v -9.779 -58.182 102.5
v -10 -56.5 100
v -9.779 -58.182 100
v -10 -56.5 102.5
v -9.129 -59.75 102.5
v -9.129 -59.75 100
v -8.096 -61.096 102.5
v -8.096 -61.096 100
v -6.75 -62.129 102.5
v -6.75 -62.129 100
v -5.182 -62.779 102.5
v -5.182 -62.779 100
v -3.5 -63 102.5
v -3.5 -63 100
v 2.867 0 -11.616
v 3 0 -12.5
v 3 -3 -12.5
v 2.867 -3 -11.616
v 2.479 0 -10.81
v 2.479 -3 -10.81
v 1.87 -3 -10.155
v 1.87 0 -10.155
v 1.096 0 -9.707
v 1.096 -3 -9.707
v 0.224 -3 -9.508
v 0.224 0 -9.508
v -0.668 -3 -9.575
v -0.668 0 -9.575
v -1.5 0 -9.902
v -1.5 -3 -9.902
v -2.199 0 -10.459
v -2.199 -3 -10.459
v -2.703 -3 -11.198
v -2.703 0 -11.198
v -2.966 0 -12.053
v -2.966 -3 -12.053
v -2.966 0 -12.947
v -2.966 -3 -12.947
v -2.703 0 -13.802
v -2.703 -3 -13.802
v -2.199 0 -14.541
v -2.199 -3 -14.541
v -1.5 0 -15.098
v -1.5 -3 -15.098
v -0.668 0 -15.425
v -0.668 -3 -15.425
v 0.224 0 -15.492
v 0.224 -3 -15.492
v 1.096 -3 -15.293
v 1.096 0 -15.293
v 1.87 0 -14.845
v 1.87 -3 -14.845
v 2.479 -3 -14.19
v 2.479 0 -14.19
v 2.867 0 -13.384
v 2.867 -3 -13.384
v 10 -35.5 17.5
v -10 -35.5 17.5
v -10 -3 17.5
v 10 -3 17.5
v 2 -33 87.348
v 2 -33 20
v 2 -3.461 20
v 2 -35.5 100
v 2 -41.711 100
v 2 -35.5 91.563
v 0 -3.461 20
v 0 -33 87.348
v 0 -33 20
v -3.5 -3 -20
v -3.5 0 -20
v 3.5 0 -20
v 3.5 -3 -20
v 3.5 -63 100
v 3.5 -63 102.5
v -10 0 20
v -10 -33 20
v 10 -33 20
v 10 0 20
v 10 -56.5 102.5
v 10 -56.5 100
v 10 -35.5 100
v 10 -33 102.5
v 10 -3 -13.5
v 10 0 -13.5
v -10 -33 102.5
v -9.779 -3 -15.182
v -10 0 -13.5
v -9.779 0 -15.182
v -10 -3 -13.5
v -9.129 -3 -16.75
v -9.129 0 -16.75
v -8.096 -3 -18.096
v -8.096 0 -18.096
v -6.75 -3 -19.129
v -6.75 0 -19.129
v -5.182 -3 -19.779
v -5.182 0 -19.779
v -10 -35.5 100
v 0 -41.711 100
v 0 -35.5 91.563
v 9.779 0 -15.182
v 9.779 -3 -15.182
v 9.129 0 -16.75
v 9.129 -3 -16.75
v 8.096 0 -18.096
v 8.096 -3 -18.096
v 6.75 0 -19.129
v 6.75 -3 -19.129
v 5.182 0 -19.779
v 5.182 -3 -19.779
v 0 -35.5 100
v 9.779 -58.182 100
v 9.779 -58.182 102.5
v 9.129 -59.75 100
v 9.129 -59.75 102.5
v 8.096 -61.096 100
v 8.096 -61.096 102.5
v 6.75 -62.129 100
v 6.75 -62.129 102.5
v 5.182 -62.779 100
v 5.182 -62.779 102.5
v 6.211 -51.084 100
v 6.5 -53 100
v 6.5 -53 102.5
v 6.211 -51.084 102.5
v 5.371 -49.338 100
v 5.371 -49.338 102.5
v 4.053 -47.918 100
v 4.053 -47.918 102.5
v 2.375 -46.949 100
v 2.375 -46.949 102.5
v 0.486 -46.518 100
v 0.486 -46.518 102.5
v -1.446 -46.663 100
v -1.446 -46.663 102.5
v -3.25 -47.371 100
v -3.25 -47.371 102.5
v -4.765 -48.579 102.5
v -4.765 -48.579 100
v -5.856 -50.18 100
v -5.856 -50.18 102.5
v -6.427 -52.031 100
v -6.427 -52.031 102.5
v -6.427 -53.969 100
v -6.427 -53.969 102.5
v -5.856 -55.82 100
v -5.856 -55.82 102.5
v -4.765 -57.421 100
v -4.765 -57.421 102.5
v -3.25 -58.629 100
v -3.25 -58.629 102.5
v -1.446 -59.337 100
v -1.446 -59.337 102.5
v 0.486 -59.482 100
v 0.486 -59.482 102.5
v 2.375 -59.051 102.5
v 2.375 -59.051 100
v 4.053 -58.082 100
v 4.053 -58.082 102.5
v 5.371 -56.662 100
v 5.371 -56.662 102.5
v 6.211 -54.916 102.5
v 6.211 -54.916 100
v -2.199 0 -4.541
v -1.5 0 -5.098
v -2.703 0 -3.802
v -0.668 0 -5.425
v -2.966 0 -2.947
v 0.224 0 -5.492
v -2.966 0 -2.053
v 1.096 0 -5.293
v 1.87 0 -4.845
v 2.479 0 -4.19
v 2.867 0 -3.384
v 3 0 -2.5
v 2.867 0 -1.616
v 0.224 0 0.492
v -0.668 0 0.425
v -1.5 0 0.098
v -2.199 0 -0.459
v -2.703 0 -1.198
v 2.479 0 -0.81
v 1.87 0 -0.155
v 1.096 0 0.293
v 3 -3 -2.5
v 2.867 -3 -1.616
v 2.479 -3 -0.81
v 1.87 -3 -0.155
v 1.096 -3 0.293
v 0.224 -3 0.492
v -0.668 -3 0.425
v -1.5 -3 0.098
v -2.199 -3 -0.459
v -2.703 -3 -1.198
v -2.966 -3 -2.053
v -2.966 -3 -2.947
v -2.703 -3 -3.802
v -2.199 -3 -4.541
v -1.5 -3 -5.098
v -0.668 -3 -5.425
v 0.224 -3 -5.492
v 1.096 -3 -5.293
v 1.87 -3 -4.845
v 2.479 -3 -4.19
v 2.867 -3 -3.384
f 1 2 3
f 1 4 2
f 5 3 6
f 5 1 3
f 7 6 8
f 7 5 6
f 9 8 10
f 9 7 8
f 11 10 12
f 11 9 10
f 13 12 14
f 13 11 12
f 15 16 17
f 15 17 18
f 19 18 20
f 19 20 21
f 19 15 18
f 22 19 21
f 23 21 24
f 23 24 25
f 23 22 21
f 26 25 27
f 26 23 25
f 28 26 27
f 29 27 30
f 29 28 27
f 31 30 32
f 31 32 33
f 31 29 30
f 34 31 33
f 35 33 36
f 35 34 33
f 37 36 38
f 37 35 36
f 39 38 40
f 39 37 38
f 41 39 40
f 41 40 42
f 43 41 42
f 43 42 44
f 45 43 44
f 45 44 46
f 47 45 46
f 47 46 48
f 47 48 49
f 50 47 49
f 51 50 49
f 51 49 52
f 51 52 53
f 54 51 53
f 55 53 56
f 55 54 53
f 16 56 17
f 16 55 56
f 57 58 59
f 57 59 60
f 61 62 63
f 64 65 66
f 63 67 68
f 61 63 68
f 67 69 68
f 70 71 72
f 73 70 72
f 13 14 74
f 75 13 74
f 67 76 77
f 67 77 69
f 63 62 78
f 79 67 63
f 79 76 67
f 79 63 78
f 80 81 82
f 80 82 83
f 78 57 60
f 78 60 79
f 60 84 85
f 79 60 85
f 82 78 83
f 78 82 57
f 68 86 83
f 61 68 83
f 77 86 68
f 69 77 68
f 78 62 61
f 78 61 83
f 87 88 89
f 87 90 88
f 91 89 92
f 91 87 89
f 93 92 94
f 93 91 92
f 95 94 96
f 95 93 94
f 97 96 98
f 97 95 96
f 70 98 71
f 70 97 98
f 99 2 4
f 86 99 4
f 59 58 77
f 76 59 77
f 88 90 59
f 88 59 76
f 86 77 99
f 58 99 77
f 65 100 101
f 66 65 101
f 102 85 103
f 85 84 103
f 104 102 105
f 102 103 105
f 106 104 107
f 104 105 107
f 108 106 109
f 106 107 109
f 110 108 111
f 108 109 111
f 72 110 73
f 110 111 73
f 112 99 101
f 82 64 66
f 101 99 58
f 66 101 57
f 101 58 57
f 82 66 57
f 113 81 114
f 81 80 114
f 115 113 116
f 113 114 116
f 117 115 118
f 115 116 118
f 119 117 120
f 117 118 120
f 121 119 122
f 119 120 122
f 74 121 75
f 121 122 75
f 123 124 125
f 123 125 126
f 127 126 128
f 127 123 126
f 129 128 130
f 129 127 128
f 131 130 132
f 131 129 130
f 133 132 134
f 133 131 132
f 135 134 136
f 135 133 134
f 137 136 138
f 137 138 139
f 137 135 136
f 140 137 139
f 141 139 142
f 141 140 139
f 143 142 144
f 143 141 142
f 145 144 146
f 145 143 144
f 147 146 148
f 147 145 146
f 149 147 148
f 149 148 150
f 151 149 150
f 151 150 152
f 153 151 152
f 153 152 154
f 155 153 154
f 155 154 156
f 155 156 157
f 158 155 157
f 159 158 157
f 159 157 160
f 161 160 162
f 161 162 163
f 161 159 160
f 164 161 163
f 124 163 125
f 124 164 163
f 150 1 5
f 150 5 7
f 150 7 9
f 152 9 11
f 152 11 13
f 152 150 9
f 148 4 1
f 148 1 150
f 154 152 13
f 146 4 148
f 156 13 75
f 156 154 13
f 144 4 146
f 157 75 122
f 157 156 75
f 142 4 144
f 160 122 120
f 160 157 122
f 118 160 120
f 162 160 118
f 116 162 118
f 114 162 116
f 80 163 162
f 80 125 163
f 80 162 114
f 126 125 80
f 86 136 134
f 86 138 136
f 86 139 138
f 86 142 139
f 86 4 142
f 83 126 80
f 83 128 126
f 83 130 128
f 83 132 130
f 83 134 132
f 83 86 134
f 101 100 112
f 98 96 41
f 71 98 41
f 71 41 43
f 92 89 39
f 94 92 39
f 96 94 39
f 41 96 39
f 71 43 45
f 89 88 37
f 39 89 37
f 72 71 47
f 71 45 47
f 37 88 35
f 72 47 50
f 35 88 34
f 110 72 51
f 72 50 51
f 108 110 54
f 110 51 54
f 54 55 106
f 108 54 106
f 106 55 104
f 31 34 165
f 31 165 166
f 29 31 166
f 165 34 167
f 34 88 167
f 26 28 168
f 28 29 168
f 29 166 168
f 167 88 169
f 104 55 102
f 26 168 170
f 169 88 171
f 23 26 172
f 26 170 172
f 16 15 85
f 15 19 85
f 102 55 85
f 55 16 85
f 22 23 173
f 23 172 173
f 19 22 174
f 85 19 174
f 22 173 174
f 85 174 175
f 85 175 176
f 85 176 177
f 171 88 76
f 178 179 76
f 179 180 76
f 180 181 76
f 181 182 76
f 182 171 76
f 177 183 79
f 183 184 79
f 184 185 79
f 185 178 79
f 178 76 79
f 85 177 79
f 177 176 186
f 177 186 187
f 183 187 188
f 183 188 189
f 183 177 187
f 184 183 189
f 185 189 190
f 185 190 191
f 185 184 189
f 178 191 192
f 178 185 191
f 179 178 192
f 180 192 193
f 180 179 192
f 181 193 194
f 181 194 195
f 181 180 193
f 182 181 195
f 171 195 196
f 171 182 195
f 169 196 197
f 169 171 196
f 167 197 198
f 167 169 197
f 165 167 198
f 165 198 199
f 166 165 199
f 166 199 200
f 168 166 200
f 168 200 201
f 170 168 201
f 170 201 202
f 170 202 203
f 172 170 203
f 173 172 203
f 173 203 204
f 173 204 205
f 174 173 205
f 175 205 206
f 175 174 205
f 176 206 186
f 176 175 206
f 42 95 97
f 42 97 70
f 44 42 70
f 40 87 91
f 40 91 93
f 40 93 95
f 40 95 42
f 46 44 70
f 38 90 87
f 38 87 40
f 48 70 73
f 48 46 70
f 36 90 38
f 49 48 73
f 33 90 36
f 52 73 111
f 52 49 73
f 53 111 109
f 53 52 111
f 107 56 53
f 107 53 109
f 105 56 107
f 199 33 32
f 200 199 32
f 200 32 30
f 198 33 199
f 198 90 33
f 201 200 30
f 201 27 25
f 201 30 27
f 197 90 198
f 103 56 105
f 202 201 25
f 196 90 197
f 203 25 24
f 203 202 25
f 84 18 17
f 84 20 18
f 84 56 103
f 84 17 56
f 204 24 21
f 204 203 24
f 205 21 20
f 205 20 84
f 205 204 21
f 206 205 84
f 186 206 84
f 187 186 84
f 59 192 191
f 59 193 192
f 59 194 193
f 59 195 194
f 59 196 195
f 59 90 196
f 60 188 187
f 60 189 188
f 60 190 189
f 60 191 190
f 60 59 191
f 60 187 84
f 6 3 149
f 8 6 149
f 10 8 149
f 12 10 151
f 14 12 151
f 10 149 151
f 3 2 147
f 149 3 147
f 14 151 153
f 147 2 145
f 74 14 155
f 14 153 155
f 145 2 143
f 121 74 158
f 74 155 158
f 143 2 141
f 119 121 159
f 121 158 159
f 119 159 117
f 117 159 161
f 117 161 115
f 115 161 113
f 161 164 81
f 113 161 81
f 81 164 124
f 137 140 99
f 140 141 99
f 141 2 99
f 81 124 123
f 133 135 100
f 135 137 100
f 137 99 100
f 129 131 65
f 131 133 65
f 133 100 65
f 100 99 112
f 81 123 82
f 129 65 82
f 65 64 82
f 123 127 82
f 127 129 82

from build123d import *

# Parameters (mm, degrees)
F0_W      = 20
F0_H      = 40
F0_R      = 3
F1_DEPTH  = 3
F2_W      = 20
F2_H      = 2.5
F3_DEPTH  = 32.5
F4_W      = 20
F4_H      = 2.5
F5_DEPTH  = 80
F6_W      = 20
F6_H      = 30
F6_R      = 6.5
F7_DEPTH  = 2.5
F9_DEPTH  = 2
F11_DEPTH = 2
F12_R     = 6.5


with BuildPart() as f1:
    # F0 (on Front) → F1 (new body)
    with BuildSketch(Plane.XZ):
        Rectangle(F0_W, F0_H)
        with Locations((0, -12.5)):
            Circle(F0_R, mode=Mode.SUBTRACT)
        with Locations((0, -2.5)):
            Circle(F0_R, mode=Mode.SUBTRACT)
    extrude(amount=F1_DEPTH)

    # F2 (on face) → F3 (join)
    with BuildSketch(Plane.XZ.offset(3)):
        with Locations((0, 18.75)):
            Rectangle(F2_W, F2_H)
    extrude(amount=F3_DEPTH)

    # F4 (on face) → F5 (join)
    with BuildSketch(Plane.XY.offset(20)):
        with Locations((0, -34.25)):
            Rectangle(F4_W, F4_H)
    extrude(amount=F5_DEPTH)

    # F6 (on face) → F7 (join)
    with BuildSketch(Plane.XY.offset(100)):
        with Locations((0, -48)):
            Rectangle(F6_W, F6_H)
        with Locations((0, -53)):
            Circle(F6_R, mode=Mode.SUBTRACT)
    extrude(amount=F7_DEPTH)

    # F8 (on Right) → F9 (join)
    with BuildSketch(Plane.YZ):
        Polygon((-34.184523, 89.776114), (-34.184523, 101.863012), (-43.082852, 101.863012), align=None)
    extrude(amount=F9_DEPTH)

    # F10 (on Right) → F11 (join)
    with BuildSketch(Plane.YZ):
        Polygon((-2.943157, 18.818472), (-34.36638, 90.463422), (-34.156892, 18.818472), align=None)
    extrude(amount=F11_DEPTH)

    # F12
    f12_edges = [f1.edges().sort_by_distance(p)[0] for p in [
        (-10, -63, 101.25),
        (10, -63, 101.25),
        (-10, -1.5, -20),
        (10, -1.5, -20),
    ]]
    fillet(f12_edges, radius=F12_R)


solid = f1.part
